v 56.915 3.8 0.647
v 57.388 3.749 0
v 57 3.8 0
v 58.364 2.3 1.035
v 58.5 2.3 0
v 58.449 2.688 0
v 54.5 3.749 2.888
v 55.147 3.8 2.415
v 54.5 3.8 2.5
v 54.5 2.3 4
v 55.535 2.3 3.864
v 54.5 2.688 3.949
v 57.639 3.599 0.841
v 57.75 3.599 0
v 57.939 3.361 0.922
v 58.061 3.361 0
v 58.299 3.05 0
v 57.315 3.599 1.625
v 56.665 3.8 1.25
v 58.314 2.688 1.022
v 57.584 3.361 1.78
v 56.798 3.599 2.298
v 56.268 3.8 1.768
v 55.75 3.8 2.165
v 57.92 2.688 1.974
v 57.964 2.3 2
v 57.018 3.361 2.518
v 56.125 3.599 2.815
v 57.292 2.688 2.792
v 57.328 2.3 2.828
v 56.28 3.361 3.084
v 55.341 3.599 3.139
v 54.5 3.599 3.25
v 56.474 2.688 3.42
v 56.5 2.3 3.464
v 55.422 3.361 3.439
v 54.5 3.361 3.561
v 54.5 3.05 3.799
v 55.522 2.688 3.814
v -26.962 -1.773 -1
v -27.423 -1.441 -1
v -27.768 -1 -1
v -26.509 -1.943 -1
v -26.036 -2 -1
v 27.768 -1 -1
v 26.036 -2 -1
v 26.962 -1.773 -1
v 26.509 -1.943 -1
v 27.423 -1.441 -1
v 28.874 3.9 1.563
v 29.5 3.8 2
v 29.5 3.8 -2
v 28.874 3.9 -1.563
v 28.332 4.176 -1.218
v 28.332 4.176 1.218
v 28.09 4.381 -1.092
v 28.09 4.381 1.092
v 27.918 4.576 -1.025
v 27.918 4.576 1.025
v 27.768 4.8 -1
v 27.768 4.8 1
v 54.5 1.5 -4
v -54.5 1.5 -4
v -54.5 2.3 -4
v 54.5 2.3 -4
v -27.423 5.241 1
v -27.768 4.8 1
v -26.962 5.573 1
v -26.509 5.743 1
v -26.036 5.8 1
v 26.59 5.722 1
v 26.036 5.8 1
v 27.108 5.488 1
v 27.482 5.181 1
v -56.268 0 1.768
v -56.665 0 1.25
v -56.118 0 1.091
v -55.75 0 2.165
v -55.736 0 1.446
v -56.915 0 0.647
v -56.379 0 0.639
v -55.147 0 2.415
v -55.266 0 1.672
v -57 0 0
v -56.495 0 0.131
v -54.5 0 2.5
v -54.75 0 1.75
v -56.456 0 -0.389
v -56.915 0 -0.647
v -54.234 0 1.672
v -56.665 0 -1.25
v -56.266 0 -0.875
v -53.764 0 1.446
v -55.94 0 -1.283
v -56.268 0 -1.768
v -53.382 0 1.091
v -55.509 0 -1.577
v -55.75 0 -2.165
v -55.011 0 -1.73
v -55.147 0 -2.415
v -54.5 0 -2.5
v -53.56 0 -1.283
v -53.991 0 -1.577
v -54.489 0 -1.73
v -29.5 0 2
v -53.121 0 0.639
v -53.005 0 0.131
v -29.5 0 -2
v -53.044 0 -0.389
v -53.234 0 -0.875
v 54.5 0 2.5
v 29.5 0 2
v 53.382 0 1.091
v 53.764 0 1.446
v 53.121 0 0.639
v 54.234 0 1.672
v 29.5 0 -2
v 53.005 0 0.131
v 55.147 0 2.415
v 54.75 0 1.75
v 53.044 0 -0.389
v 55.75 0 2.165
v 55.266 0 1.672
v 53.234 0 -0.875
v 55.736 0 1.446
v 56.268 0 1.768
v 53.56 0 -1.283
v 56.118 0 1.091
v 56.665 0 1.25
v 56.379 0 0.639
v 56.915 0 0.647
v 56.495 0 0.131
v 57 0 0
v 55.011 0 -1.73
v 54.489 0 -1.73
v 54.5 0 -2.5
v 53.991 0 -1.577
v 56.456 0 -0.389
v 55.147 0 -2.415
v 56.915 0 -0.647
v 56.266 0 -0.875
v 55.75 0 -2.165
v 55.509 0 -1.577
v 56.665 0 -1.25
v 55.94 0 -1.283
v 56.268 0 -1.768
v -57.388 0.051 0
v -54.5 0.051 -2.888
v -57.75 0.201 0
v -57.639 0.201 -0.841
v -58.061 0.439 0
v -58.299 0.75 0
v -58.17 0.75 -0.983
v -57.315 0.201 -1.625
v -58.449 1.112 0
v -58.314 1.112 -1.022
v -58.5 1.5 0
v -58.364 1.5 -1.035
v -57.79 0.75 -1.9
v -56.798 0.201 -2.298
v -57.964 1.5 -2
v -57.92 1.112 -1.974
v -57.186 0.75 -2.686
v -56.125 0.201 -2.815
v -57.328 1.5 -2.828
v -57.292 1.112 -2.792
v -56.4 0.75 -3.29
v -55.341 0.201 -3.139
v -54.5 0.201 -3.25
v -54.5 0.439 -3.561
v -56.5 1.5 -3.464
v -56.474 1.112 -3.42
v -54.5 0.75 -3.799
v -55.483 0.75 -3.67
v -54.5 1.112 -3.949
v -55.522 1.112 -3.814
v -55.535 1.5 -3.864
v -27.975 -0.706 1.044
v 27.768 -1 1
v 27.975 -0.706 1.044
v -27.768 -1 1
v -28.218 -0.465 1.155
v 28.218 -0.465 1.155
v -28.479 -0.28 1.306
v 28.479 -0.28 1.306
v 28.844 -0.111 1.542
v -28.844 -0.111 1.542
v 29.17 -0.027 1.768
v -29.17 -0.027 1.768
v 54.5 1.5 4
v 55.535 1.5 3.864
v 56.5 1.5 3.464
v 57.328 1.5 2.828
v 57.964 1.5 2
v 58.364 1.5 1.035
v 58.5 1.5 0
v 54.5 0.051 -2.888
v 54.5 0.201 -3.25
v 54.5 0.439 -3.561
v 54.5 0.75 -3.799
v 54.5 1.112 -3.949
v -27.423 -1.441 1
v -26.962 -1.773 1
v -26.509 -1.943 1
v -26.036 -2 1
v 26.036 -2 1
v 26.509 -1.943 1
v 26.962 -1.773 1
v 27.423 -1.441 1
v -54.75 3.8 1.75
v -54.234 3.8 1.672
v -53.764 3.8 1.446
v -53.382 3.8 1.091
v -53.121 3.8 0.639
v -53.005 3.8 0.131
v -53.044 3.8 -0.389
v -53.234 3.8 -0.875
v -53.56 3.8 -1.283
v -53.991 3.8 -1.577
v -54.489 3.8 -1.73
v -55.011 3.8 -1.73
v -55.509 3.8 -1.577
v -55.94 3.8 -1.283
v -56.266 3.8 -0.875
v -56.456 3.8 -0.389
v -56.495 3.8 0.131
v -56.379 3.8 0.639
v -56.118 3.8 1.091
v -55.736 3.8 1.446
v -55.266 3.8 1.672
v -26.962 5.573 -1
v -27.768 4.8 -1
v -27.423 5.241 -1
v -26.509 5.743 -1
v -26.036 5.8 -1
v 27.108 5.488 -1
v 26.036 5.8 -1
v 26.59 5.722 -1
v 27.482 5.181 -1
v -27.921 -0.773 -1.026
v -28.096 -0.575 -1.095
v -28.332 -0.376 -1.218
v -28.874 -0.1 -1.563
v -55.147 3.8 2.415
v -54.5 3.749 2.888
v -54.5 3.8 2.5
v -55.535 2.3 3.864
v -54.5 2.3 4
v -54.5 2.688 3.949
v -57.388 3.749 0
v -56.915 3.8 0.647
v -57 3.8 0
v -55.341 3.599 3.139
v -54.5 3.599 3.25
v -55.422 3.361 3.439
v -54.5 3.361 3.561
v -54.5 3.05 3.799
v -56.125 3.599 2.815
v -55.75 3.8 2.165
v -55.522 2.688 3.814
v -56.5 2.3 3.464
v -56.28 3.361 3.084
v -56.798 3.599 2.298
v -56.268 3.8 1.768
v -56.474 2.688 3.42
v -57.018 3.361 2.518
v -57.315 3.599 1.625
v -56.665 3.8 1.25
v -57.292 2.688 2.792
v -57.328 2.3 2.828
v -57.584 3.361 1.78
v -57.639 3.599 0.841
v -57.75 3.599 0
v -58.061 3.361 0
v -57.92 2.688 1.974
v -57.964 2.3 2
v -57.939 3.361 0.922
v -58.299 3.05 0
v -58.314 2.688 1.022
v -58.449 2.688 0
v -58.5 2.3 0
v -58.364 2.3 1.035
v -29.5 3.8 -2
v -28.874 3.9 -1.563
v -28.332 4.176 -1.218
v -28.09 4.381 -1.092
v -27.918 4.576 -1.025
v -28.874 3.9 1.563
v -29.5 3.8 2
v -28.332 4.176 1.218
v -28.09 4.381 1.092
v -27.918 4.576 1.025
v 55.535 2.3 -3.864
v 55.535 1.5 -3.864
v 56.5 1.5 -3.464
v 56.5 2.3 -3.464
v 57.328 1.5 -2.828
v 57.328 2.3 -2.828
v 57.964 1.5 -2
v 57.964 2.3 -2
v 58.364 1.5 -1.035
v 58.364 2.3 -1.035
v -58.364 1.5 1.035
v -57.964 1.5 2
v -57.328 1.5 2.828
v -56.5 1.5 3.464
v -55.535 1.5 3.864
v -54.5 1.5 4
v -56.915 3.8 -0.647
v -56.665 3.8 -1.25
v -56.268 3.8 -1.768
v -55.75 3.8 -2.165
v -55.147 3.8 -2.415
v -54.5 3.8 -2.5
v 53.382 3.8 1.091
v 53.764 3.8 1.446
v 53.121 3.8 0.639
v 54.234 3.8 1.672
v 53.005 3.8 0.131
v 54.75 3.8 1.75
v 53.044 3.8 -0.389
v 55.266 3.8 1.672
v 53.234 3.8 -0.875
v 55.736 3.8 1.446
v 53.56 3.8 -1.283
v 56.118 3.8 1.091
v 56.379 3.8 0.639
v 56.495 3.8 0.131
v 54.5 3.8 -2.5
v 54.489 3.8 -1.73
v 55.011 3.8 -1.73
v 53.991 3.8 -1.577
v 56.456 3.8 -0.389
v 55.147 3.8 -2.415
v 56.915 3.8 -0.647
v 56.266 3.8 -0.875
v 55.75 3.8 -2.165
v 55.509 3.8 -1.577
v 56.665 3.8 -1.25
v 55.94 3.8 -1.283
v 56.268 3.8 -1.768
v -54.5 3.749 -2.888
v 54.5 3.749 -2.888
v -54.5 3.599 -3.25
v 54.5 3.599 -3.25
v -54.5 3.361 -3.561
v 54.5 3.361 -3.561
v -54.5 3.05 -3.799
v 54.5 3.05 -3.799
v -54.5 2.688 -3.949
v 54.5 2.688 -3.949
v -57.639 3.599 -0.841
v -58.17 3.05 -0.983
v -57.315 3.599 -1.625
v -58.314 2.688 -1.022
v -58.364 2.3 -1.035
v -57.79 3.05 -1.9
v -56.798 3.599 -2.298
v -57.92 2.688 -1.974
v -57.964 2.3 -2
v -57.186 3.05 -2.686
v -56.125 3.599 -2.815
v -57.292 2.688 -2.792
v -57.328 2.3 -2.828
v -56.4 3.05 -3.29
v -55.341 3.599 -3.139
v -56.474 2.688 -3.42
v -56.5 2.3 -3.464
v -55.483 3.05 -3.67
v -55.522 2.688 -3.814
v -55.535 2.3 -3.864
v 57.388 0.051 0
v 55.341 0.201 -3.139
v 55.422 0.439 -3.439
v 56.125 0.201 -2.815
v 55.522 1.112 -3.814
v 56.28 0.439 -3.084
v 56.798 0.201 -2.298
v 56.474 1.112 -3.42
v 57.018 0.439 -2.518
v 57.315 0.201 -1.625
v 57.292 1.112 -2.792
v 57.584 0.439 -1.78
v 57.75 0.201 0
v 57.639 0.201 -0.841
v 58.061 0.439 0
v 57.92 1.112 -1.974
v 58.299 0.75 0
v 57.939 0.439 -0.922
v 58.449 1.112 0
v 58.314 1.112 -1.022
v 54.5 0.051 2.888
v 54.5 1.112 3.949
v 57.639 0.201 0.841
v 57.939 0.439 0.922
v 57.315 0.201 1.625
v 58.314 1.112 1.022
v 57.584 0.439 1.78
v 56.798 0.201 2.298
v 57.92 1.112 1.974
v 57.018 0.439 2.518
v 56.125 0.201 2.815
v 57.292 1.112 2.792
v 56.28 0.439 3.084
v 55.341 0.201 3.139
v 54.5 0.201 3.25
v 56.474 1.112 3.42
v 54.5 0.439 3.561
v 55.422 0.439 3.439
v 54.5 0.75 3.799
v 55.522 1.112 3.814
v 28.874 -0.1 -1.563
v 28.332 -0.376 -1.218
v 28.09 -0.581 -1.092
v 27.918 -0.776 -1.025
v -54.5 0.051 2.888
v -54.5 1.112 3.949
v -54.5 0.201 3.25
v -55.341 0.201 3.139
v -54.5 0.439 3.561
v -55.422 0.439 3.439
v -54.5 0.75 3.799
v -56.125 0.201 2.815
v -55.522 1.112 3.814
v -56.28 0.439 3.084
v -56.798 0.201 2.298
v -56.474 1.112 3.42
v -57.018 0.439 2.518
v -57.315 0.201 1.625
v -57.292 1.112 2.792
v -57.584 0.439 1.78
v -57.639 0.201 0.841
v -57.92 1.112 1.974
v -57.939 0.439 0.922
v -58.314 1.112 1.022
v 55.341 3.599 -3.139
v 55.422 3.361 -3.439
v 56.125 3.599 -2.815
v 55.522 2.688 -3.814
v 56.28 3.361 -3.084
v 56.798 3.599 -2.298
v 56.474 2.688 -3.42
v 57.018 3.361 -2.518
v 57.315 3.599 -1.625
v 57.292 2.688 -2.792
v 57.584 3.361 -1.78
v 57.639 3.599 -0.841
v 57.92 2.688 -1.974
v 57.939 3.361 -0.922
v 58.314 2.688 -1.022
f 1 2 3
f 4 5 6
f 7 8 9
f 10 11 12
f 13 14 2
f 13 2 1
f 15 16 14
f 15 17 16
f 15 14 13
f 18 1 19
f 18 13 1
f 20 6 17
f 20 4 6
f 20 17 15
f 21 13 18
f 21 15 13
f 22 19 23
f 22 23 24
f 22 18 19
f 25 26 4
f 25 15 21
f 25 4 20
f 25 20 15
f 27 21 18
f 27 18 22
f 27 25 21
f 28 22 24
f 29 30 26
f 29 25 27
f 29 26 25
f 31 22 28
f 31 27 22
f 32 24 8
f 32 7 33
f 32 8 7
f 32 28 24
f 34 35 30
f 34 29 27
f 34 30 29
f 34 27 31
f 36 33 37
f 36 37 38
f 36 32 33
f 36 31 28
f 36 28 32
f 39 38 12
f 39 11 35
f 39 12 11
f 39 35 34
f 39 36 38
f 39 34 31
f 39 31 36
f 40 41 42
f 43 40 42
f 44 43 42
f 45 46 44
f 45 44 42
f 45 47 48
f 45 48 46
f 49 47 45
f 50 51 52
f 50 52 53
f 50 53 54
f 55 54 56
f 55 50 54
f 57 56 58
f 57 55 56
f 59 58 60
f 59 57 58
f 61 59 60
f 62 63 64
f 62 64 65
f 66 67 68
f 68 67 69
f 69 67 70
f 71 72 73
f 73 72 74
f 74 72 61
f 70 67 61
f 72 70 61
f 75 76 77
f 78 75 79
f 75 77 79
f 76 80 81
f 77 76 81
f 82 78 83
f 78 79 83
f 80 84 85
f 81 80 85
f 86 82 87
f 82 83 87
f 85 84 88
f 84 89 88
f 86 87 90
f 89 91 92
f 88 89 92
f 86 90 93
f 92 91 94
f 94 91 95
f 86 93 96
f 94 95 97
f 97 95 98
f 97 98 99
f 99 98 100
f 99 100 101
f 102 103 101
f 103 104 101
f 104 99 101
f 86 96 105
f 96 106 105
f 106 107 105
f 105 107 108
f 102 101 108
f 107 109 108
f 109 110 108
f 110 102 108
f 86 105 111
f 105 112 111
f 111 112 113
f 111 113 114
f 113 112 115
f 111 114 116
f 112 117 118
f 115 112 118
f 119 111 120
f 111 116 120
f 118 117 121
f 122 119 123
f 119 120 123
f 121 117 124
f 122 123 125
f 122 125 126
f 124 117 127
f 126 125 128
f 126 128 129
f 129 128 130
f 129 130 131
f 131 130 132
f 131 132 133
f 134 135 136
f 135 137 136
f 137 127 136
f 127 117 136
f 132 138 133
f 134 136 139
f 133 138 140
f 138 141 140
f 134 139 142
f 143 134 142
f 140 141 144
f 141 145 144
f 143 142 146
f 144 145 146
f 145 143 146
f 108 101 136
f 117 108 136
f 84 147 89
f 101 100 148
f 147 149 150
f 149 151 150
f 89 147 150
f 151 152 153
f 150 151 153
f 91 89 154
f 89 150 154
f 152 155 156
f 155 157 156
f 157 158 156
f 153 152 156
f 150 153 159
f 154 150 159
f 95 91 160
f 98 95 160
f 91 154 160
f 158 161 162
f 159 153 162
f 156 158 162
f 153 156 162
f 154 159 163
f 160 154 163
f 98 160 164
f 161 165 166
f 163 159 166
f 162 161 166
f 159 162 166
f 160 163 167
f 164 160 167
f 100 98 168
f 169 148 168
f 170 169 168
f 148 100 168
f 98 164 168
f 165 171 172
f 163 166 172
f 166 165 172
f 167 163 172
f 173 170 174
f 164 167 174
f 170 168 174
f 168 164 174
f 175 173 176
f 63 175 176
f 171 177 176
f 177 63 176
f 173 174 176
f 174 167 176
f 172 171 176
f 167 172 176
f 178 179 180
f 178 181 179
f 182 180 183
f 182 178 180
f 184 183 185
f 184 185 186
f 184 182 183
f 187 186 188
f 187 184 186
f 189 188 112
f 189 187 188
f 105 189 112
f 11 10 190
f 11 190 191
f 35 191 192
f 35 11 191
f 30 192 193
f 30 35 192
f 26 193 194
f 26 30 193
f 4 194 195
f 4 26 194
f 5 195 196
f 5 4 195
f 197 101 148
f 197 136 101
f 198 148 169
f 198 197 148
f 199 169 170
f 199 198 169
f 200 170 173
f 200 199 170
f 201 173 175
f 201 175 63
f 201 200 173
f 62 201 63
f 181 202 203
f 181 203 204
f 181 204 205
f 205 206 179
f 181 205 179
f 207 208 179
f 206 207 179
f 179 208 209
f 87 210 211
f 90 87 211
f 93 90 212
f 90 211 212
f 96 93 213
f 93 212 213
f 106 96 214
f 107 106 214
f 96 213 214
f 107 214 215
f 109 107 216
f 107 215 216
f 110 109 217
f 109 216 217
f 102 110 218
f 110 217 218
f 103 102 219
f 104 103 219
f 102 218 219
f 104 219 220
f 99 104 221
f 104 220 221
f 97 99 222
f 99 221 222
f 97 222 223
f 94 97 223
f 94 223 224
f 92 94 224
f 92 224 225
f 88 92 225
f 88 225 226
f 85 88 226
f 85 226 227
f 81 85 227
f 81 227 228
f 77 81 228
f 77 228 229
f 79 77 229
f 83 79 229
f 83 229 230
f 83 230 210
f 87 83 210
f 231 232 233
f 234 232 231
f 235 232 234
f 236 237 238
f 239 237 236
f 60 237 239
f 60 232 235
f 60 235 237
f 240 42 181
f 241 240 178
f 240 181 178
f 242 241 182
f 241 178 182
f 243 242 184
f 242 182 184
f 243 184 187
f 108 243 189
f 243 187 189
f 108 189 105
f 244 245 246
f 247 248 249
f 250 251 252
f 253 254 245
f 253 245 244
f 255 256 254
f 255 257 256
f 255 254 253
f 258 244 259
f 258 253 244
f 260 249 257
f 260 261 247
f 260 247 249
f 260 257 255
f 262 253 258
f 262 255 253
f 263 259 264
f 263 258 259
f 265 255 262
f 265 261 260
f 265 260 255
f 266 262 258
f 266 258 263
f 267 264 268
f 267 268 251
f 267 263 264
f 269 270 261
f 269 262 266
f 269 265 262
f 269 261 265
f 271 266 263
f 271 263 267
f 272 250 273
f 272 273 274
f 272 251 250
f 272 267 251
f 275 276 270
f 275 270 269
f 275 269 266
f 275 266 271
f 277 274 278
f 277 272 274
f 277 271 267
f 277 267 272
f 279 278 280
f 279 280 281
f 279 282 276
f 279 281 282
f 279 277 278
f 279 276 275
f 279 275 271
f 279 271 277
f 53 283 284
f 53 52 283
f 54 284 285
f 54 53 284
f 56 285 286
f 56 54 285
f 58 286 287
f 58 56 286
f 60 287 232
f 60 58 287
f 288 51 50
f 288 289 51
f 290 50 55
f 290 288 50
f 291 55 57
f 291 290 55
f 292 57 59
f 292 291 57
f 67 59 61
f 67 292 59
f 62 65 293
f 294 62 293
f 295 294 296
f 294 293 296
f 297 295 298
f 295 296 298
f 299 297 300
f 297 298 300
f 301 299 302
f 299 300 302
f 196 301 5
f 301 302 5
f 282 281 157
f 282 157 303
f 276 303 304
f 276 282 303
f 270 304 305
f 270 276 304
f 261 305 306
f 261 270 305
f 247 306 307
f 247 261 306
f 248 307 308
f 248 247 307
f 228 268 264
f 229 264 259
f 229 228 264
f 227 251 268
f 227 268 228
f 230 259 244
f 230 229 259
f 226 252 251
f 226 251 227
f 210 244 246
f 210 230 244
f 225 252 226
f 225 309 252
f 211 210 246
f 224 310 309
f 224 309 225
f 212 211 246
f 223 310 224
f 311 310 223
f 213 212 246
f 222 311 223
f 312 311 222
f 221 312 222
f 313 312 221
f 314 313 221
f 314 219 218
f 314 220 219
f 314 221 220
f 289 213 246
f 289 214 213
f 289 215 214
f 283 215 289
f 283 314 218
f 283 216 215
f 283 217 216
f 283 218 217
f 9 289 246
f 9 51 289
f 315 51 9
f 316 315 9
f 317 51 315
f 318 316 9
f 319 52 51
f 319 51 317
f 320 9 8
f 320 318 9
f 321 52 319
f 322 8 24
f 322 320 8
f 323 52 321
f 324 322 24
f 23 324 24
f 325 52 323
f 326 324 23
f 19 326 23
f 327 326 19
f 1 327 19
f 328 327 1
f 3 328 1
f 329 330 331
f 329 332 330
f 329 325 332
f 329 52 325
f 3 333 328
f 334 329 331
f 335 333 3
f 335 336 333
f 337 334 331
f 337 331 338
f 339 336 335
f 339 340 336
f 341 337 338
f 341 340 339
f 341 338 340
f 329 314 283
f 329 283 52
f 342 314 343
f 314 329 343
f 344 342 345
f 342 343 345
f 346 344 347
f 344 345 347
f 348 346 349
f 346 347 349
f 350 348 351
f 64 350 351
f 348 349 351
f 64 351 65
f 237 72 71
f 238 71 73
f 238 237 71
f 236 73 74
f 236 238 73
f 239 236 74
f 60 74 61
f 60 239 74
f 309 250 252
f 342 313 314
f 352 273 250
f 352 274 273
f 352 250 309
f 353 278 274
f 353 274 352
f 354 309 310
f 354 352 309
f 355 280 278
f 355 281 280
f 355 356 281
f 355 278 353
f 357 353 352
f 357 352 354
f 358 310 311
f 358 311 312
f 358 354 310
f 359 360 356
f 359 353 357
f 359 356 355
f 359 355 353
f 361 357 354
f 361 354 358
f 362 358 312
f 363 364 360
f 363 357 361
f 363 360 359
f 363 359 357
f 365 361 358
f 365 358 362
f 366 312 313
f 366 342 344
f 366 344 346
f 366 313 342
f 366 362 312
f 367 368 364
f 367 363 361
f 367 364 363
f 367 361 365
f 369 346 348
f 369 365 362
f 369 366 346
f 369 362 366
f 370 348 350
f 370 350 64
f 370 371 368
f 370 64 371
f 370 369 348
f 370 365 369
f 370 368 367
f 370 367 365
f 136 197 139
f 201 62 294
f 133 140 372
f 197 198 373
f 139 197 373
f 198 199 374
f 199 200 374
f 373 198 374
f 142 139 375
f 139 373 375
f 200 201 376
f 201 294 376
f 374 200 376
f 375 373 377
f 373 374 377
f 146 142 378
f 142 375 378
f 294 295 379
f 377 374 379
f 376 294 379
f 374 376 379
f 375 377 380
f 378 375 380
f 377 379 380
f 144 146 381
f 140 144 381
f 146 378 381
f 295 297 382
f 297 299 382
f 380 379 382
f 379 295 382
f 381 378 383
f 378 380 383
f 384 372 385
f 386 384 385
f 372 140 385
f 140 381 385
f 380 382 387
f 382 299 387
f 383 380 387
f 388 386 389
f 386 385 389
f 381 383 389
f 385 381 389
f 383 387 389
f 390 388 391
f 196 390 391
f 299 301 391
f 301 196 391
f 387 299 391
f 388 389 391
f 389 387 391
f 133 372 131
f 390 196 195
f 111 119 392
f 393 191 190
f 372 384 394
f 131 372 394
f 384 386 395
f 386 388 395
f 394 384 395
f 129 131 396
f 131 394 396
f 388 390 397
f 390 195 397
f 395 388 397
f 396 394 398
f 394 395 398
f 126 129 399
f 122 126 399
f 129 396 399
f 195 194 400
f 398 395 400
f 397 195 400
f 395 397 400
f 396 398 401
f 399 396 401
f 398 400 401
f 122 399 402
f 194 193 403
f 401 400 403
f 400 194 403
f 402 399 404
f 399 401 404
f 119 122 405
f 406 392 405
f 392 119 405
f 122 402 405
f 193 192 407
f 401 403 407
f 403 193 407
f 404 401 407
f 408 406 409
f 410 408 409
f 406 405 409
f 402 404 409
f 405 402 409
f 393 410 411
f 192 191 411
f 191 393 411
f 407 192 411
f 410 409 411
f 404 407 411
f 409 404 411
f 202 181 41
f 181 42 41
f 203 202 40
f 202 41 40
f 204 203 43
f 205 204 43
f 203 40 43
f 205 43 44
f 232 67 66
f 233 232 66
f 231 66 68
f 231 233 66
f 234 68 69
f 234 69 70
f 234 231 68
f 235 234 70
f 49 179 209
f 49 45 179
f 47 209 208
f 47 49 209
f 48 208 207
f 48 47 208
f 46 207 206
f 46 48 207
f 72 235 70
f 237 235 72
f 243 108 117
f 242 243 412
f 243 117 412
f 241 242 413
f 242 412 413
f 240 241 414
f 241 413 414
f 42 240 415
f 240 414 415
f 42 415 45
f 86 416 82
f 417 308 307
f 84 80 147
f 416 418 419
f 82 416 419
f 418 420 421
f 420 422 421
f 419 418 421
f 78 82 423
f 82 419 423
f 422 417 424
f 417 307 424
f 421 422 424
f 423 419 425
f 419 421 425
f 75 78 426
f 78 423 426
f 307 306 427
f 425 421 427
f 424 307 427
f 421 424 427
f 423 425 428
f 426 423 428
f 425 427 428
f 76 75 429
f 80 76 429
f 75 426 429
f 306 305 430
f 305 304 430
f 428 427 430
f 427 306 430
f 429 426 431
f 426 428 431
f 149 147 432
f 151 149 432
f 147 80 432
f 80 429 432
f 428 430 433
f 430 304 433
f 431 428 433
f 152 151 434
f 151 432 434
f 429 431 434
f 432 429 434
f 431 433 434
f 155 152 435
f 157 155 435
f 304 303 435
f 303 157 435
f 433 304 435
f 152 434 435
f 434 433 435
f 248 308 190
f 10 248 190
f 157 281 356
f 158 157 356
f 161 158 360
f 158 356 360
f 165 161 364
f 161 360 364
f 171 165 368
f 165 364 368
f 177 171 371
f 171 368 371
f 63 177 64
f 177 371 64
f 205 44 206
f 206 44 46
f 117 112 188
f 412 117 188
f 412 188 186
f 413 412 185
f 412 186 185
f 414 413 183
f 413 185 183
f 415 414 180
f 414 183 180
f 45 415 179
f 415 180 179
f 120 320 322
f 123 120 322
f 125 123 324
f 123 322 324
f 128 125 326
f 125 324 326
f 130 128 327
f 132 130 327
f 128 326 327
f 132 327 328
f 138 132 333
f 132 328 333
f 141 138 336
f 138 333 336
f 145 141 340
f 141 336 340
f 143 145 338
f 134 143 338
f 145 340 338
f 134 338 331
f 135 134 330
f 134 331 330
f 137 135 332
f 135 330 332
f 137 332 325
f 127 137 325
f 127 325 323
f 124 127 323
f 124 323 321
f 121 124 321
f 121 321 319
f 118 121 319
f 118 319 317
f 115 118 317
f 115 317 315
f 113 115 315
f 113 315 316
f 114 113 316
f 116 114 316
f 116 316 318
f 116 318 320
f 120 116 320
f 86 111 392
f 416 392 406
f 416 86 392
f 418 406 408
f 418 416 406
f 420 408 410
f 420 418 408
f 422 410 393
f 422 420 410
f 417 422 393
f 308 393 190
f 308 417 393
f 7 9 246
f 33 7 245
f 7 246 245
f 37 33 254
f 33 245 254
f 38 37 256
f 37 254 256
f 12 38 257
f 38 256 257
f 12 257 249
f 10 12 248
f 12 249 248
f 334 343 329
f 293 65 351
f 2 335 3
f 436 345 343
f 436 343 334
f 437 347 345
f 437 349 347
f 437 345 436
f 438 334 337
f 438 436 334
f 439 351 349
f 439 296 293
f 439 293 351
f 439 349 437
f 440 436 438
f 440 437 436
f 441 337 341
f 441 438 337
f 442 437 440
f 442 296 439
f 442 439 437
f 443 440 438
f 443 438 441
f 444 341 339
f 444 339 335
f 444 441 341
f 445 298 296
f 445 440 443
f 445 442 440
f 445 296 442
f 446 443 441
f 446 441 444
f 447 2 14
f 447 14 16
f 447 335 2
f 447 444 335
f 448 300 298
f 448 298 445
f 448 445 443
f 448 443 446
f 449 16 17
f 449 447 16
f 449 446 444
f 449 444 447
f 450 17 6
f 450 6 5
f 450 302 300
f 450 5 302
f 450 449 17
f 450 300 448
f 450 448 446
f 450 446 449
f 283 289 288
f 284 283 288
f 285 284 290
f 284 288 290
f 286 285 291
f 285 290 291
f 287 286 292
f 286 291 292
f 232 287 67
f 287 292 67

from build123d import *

# Parameters (mm, degrees)
SKETCH1_W                = 117
SKETCH1_H                = 8
BOSS_EXTRUDE1_DEPTH      = 3.8
SKETCH2_R                = 1.75
CUT_EXTRUDE4_DEPTH       = 59.759594961
FILLET1_R                = 4
FILLET2_R                = 1.5
BOSS_EXTRUDE2_DEPTH      = 2
BOSS_EXTRUDE2_DEPTH_BACK = 5.8
SKETCH3_W                = 55
SKETCH3_H                = 2
FILLET3_R                = 2
FILLET4_R                = 2
FILLET5_R                = 1


with BuildPart() as part:
    # Sketch1 → Boss-Extrude1 (new body)
    with BuildSketch(Plane(origin=(0, 0, 0), x_dir=(1, 0, 0), z_dir=(0, 1, 0))):
        Rectangle(SKETCH1_W, SKETCH1_H)
    extrude(amount=BOSS_EXTRUDE1_DEPTH)

    # Sketch2 → Cut-Extrude4 (cut, through all)
    with BuildSketch(Plane(origin=(0, 3.8, 0), x_dir=(1, 0, 0), z_dir=(0, 1, 0))):
        with Locations(Location((-54.75, 0, 0), (0, 0, 270))):
            Circle(SKETCH2_R)
        with Locations(Location((54.75, 0, 0), (0, 0, 270))):
            Circle(SKETCH2_R)
    extrude(amount=-CUT_EXTRUDE4_DEPTH, mode=Mode.SUBTRACT)

    # Fillet1
    fillet1_edges = [part.edges().sort_by_distance(p)[0] for p in [
        (58.5, 1.9, -4),
        (58.5, 1.9, 4),
        (-58.5, 1.9, 4),
        (-58.5, 1.9, -4),
    ]]
    fillet(fillet1_edges, radius=FILLET1_R - 0.0001)  # a hair under: the kernel refuses the full size

    # Fillet2
    fillet2_edges = [part.edges().sort_by_distance(p)[0] for p in [
        (0, 0, -4),
        (0, 3.8, -4),
        (0, 0, 4),
        (-57.328456414, 0, -2.828456414),
        (-57.328456414, 0, 2.828456414),
        (57.328456414, 0, 2.828456414),
        (57.328456414, 0, -2.828456414),
        (0, 3.8, 4),
        (-57.328456414, 3.8, -2.828456414),
        (-57.328456414, 3.8, 2.828456414),
        (57.328456414, 3.8, 2.828456414),
        (57.328456414, 3.8, -2.828456414),
    ]]
    fillet(fillet2_edges, radius=FILLET2_R)

    # Sketch3 → Boss-Extrude2 (add, two sides: drawn at the far end of the back side and taken through both)
    with BuildSketch(Plane(origin=(0, 3.8, 0), x_dir=(1, 0, 0), z_dir=(0, 1, 0)).offset(-BOSS_EXTRUDE2_DEPTH_BACK)):
        Rectangle(SKETCH3_W, SKETCH3_H)
    extrude(amount=BOSS_EXTRUDE2_DEPTH + BOSS_EXTRUDE2_DEPTH_BACK)

    # Fillet3
    fillet3_edges = [part.edges().sort_by_distance(p)[0] for p in [
        (-27.5, 0, 0),
        (27.5, 0, 0),
        (-27.5, 3.8, 0),
        (27.5, 3.8, 0),
    ]]
    fillet(fillet3_edges, radius=FILLET3_R - 0.0001)  # a hair under: the kernel refuses the full size

    # Fillet4
    fillet4_edges = [part.edges().sort_by_distance(p)[0] for p in [
        (27.5, -2, 0),
        (-27.5, -2, 0),
        (27.5, 5.8, 0),
        (-27.5, 5.8, 0),
    ]]
    fillet(fillet4_edges, radius=FILLET4_R)

    # Fillet5
    fillet5_edges = [part.edges().sort_by_distance(p)[0] for p in [
        (0, 3.8, -1),
        (0, 3.8, 1),
        (0, 0, 1),
        (0, 0, -1),
    ]]
    fillet(fillet5_edges, radius=FILLET5_R - 0.0001)  # a hair under: the kernel refuses the full size


solid = part.part
